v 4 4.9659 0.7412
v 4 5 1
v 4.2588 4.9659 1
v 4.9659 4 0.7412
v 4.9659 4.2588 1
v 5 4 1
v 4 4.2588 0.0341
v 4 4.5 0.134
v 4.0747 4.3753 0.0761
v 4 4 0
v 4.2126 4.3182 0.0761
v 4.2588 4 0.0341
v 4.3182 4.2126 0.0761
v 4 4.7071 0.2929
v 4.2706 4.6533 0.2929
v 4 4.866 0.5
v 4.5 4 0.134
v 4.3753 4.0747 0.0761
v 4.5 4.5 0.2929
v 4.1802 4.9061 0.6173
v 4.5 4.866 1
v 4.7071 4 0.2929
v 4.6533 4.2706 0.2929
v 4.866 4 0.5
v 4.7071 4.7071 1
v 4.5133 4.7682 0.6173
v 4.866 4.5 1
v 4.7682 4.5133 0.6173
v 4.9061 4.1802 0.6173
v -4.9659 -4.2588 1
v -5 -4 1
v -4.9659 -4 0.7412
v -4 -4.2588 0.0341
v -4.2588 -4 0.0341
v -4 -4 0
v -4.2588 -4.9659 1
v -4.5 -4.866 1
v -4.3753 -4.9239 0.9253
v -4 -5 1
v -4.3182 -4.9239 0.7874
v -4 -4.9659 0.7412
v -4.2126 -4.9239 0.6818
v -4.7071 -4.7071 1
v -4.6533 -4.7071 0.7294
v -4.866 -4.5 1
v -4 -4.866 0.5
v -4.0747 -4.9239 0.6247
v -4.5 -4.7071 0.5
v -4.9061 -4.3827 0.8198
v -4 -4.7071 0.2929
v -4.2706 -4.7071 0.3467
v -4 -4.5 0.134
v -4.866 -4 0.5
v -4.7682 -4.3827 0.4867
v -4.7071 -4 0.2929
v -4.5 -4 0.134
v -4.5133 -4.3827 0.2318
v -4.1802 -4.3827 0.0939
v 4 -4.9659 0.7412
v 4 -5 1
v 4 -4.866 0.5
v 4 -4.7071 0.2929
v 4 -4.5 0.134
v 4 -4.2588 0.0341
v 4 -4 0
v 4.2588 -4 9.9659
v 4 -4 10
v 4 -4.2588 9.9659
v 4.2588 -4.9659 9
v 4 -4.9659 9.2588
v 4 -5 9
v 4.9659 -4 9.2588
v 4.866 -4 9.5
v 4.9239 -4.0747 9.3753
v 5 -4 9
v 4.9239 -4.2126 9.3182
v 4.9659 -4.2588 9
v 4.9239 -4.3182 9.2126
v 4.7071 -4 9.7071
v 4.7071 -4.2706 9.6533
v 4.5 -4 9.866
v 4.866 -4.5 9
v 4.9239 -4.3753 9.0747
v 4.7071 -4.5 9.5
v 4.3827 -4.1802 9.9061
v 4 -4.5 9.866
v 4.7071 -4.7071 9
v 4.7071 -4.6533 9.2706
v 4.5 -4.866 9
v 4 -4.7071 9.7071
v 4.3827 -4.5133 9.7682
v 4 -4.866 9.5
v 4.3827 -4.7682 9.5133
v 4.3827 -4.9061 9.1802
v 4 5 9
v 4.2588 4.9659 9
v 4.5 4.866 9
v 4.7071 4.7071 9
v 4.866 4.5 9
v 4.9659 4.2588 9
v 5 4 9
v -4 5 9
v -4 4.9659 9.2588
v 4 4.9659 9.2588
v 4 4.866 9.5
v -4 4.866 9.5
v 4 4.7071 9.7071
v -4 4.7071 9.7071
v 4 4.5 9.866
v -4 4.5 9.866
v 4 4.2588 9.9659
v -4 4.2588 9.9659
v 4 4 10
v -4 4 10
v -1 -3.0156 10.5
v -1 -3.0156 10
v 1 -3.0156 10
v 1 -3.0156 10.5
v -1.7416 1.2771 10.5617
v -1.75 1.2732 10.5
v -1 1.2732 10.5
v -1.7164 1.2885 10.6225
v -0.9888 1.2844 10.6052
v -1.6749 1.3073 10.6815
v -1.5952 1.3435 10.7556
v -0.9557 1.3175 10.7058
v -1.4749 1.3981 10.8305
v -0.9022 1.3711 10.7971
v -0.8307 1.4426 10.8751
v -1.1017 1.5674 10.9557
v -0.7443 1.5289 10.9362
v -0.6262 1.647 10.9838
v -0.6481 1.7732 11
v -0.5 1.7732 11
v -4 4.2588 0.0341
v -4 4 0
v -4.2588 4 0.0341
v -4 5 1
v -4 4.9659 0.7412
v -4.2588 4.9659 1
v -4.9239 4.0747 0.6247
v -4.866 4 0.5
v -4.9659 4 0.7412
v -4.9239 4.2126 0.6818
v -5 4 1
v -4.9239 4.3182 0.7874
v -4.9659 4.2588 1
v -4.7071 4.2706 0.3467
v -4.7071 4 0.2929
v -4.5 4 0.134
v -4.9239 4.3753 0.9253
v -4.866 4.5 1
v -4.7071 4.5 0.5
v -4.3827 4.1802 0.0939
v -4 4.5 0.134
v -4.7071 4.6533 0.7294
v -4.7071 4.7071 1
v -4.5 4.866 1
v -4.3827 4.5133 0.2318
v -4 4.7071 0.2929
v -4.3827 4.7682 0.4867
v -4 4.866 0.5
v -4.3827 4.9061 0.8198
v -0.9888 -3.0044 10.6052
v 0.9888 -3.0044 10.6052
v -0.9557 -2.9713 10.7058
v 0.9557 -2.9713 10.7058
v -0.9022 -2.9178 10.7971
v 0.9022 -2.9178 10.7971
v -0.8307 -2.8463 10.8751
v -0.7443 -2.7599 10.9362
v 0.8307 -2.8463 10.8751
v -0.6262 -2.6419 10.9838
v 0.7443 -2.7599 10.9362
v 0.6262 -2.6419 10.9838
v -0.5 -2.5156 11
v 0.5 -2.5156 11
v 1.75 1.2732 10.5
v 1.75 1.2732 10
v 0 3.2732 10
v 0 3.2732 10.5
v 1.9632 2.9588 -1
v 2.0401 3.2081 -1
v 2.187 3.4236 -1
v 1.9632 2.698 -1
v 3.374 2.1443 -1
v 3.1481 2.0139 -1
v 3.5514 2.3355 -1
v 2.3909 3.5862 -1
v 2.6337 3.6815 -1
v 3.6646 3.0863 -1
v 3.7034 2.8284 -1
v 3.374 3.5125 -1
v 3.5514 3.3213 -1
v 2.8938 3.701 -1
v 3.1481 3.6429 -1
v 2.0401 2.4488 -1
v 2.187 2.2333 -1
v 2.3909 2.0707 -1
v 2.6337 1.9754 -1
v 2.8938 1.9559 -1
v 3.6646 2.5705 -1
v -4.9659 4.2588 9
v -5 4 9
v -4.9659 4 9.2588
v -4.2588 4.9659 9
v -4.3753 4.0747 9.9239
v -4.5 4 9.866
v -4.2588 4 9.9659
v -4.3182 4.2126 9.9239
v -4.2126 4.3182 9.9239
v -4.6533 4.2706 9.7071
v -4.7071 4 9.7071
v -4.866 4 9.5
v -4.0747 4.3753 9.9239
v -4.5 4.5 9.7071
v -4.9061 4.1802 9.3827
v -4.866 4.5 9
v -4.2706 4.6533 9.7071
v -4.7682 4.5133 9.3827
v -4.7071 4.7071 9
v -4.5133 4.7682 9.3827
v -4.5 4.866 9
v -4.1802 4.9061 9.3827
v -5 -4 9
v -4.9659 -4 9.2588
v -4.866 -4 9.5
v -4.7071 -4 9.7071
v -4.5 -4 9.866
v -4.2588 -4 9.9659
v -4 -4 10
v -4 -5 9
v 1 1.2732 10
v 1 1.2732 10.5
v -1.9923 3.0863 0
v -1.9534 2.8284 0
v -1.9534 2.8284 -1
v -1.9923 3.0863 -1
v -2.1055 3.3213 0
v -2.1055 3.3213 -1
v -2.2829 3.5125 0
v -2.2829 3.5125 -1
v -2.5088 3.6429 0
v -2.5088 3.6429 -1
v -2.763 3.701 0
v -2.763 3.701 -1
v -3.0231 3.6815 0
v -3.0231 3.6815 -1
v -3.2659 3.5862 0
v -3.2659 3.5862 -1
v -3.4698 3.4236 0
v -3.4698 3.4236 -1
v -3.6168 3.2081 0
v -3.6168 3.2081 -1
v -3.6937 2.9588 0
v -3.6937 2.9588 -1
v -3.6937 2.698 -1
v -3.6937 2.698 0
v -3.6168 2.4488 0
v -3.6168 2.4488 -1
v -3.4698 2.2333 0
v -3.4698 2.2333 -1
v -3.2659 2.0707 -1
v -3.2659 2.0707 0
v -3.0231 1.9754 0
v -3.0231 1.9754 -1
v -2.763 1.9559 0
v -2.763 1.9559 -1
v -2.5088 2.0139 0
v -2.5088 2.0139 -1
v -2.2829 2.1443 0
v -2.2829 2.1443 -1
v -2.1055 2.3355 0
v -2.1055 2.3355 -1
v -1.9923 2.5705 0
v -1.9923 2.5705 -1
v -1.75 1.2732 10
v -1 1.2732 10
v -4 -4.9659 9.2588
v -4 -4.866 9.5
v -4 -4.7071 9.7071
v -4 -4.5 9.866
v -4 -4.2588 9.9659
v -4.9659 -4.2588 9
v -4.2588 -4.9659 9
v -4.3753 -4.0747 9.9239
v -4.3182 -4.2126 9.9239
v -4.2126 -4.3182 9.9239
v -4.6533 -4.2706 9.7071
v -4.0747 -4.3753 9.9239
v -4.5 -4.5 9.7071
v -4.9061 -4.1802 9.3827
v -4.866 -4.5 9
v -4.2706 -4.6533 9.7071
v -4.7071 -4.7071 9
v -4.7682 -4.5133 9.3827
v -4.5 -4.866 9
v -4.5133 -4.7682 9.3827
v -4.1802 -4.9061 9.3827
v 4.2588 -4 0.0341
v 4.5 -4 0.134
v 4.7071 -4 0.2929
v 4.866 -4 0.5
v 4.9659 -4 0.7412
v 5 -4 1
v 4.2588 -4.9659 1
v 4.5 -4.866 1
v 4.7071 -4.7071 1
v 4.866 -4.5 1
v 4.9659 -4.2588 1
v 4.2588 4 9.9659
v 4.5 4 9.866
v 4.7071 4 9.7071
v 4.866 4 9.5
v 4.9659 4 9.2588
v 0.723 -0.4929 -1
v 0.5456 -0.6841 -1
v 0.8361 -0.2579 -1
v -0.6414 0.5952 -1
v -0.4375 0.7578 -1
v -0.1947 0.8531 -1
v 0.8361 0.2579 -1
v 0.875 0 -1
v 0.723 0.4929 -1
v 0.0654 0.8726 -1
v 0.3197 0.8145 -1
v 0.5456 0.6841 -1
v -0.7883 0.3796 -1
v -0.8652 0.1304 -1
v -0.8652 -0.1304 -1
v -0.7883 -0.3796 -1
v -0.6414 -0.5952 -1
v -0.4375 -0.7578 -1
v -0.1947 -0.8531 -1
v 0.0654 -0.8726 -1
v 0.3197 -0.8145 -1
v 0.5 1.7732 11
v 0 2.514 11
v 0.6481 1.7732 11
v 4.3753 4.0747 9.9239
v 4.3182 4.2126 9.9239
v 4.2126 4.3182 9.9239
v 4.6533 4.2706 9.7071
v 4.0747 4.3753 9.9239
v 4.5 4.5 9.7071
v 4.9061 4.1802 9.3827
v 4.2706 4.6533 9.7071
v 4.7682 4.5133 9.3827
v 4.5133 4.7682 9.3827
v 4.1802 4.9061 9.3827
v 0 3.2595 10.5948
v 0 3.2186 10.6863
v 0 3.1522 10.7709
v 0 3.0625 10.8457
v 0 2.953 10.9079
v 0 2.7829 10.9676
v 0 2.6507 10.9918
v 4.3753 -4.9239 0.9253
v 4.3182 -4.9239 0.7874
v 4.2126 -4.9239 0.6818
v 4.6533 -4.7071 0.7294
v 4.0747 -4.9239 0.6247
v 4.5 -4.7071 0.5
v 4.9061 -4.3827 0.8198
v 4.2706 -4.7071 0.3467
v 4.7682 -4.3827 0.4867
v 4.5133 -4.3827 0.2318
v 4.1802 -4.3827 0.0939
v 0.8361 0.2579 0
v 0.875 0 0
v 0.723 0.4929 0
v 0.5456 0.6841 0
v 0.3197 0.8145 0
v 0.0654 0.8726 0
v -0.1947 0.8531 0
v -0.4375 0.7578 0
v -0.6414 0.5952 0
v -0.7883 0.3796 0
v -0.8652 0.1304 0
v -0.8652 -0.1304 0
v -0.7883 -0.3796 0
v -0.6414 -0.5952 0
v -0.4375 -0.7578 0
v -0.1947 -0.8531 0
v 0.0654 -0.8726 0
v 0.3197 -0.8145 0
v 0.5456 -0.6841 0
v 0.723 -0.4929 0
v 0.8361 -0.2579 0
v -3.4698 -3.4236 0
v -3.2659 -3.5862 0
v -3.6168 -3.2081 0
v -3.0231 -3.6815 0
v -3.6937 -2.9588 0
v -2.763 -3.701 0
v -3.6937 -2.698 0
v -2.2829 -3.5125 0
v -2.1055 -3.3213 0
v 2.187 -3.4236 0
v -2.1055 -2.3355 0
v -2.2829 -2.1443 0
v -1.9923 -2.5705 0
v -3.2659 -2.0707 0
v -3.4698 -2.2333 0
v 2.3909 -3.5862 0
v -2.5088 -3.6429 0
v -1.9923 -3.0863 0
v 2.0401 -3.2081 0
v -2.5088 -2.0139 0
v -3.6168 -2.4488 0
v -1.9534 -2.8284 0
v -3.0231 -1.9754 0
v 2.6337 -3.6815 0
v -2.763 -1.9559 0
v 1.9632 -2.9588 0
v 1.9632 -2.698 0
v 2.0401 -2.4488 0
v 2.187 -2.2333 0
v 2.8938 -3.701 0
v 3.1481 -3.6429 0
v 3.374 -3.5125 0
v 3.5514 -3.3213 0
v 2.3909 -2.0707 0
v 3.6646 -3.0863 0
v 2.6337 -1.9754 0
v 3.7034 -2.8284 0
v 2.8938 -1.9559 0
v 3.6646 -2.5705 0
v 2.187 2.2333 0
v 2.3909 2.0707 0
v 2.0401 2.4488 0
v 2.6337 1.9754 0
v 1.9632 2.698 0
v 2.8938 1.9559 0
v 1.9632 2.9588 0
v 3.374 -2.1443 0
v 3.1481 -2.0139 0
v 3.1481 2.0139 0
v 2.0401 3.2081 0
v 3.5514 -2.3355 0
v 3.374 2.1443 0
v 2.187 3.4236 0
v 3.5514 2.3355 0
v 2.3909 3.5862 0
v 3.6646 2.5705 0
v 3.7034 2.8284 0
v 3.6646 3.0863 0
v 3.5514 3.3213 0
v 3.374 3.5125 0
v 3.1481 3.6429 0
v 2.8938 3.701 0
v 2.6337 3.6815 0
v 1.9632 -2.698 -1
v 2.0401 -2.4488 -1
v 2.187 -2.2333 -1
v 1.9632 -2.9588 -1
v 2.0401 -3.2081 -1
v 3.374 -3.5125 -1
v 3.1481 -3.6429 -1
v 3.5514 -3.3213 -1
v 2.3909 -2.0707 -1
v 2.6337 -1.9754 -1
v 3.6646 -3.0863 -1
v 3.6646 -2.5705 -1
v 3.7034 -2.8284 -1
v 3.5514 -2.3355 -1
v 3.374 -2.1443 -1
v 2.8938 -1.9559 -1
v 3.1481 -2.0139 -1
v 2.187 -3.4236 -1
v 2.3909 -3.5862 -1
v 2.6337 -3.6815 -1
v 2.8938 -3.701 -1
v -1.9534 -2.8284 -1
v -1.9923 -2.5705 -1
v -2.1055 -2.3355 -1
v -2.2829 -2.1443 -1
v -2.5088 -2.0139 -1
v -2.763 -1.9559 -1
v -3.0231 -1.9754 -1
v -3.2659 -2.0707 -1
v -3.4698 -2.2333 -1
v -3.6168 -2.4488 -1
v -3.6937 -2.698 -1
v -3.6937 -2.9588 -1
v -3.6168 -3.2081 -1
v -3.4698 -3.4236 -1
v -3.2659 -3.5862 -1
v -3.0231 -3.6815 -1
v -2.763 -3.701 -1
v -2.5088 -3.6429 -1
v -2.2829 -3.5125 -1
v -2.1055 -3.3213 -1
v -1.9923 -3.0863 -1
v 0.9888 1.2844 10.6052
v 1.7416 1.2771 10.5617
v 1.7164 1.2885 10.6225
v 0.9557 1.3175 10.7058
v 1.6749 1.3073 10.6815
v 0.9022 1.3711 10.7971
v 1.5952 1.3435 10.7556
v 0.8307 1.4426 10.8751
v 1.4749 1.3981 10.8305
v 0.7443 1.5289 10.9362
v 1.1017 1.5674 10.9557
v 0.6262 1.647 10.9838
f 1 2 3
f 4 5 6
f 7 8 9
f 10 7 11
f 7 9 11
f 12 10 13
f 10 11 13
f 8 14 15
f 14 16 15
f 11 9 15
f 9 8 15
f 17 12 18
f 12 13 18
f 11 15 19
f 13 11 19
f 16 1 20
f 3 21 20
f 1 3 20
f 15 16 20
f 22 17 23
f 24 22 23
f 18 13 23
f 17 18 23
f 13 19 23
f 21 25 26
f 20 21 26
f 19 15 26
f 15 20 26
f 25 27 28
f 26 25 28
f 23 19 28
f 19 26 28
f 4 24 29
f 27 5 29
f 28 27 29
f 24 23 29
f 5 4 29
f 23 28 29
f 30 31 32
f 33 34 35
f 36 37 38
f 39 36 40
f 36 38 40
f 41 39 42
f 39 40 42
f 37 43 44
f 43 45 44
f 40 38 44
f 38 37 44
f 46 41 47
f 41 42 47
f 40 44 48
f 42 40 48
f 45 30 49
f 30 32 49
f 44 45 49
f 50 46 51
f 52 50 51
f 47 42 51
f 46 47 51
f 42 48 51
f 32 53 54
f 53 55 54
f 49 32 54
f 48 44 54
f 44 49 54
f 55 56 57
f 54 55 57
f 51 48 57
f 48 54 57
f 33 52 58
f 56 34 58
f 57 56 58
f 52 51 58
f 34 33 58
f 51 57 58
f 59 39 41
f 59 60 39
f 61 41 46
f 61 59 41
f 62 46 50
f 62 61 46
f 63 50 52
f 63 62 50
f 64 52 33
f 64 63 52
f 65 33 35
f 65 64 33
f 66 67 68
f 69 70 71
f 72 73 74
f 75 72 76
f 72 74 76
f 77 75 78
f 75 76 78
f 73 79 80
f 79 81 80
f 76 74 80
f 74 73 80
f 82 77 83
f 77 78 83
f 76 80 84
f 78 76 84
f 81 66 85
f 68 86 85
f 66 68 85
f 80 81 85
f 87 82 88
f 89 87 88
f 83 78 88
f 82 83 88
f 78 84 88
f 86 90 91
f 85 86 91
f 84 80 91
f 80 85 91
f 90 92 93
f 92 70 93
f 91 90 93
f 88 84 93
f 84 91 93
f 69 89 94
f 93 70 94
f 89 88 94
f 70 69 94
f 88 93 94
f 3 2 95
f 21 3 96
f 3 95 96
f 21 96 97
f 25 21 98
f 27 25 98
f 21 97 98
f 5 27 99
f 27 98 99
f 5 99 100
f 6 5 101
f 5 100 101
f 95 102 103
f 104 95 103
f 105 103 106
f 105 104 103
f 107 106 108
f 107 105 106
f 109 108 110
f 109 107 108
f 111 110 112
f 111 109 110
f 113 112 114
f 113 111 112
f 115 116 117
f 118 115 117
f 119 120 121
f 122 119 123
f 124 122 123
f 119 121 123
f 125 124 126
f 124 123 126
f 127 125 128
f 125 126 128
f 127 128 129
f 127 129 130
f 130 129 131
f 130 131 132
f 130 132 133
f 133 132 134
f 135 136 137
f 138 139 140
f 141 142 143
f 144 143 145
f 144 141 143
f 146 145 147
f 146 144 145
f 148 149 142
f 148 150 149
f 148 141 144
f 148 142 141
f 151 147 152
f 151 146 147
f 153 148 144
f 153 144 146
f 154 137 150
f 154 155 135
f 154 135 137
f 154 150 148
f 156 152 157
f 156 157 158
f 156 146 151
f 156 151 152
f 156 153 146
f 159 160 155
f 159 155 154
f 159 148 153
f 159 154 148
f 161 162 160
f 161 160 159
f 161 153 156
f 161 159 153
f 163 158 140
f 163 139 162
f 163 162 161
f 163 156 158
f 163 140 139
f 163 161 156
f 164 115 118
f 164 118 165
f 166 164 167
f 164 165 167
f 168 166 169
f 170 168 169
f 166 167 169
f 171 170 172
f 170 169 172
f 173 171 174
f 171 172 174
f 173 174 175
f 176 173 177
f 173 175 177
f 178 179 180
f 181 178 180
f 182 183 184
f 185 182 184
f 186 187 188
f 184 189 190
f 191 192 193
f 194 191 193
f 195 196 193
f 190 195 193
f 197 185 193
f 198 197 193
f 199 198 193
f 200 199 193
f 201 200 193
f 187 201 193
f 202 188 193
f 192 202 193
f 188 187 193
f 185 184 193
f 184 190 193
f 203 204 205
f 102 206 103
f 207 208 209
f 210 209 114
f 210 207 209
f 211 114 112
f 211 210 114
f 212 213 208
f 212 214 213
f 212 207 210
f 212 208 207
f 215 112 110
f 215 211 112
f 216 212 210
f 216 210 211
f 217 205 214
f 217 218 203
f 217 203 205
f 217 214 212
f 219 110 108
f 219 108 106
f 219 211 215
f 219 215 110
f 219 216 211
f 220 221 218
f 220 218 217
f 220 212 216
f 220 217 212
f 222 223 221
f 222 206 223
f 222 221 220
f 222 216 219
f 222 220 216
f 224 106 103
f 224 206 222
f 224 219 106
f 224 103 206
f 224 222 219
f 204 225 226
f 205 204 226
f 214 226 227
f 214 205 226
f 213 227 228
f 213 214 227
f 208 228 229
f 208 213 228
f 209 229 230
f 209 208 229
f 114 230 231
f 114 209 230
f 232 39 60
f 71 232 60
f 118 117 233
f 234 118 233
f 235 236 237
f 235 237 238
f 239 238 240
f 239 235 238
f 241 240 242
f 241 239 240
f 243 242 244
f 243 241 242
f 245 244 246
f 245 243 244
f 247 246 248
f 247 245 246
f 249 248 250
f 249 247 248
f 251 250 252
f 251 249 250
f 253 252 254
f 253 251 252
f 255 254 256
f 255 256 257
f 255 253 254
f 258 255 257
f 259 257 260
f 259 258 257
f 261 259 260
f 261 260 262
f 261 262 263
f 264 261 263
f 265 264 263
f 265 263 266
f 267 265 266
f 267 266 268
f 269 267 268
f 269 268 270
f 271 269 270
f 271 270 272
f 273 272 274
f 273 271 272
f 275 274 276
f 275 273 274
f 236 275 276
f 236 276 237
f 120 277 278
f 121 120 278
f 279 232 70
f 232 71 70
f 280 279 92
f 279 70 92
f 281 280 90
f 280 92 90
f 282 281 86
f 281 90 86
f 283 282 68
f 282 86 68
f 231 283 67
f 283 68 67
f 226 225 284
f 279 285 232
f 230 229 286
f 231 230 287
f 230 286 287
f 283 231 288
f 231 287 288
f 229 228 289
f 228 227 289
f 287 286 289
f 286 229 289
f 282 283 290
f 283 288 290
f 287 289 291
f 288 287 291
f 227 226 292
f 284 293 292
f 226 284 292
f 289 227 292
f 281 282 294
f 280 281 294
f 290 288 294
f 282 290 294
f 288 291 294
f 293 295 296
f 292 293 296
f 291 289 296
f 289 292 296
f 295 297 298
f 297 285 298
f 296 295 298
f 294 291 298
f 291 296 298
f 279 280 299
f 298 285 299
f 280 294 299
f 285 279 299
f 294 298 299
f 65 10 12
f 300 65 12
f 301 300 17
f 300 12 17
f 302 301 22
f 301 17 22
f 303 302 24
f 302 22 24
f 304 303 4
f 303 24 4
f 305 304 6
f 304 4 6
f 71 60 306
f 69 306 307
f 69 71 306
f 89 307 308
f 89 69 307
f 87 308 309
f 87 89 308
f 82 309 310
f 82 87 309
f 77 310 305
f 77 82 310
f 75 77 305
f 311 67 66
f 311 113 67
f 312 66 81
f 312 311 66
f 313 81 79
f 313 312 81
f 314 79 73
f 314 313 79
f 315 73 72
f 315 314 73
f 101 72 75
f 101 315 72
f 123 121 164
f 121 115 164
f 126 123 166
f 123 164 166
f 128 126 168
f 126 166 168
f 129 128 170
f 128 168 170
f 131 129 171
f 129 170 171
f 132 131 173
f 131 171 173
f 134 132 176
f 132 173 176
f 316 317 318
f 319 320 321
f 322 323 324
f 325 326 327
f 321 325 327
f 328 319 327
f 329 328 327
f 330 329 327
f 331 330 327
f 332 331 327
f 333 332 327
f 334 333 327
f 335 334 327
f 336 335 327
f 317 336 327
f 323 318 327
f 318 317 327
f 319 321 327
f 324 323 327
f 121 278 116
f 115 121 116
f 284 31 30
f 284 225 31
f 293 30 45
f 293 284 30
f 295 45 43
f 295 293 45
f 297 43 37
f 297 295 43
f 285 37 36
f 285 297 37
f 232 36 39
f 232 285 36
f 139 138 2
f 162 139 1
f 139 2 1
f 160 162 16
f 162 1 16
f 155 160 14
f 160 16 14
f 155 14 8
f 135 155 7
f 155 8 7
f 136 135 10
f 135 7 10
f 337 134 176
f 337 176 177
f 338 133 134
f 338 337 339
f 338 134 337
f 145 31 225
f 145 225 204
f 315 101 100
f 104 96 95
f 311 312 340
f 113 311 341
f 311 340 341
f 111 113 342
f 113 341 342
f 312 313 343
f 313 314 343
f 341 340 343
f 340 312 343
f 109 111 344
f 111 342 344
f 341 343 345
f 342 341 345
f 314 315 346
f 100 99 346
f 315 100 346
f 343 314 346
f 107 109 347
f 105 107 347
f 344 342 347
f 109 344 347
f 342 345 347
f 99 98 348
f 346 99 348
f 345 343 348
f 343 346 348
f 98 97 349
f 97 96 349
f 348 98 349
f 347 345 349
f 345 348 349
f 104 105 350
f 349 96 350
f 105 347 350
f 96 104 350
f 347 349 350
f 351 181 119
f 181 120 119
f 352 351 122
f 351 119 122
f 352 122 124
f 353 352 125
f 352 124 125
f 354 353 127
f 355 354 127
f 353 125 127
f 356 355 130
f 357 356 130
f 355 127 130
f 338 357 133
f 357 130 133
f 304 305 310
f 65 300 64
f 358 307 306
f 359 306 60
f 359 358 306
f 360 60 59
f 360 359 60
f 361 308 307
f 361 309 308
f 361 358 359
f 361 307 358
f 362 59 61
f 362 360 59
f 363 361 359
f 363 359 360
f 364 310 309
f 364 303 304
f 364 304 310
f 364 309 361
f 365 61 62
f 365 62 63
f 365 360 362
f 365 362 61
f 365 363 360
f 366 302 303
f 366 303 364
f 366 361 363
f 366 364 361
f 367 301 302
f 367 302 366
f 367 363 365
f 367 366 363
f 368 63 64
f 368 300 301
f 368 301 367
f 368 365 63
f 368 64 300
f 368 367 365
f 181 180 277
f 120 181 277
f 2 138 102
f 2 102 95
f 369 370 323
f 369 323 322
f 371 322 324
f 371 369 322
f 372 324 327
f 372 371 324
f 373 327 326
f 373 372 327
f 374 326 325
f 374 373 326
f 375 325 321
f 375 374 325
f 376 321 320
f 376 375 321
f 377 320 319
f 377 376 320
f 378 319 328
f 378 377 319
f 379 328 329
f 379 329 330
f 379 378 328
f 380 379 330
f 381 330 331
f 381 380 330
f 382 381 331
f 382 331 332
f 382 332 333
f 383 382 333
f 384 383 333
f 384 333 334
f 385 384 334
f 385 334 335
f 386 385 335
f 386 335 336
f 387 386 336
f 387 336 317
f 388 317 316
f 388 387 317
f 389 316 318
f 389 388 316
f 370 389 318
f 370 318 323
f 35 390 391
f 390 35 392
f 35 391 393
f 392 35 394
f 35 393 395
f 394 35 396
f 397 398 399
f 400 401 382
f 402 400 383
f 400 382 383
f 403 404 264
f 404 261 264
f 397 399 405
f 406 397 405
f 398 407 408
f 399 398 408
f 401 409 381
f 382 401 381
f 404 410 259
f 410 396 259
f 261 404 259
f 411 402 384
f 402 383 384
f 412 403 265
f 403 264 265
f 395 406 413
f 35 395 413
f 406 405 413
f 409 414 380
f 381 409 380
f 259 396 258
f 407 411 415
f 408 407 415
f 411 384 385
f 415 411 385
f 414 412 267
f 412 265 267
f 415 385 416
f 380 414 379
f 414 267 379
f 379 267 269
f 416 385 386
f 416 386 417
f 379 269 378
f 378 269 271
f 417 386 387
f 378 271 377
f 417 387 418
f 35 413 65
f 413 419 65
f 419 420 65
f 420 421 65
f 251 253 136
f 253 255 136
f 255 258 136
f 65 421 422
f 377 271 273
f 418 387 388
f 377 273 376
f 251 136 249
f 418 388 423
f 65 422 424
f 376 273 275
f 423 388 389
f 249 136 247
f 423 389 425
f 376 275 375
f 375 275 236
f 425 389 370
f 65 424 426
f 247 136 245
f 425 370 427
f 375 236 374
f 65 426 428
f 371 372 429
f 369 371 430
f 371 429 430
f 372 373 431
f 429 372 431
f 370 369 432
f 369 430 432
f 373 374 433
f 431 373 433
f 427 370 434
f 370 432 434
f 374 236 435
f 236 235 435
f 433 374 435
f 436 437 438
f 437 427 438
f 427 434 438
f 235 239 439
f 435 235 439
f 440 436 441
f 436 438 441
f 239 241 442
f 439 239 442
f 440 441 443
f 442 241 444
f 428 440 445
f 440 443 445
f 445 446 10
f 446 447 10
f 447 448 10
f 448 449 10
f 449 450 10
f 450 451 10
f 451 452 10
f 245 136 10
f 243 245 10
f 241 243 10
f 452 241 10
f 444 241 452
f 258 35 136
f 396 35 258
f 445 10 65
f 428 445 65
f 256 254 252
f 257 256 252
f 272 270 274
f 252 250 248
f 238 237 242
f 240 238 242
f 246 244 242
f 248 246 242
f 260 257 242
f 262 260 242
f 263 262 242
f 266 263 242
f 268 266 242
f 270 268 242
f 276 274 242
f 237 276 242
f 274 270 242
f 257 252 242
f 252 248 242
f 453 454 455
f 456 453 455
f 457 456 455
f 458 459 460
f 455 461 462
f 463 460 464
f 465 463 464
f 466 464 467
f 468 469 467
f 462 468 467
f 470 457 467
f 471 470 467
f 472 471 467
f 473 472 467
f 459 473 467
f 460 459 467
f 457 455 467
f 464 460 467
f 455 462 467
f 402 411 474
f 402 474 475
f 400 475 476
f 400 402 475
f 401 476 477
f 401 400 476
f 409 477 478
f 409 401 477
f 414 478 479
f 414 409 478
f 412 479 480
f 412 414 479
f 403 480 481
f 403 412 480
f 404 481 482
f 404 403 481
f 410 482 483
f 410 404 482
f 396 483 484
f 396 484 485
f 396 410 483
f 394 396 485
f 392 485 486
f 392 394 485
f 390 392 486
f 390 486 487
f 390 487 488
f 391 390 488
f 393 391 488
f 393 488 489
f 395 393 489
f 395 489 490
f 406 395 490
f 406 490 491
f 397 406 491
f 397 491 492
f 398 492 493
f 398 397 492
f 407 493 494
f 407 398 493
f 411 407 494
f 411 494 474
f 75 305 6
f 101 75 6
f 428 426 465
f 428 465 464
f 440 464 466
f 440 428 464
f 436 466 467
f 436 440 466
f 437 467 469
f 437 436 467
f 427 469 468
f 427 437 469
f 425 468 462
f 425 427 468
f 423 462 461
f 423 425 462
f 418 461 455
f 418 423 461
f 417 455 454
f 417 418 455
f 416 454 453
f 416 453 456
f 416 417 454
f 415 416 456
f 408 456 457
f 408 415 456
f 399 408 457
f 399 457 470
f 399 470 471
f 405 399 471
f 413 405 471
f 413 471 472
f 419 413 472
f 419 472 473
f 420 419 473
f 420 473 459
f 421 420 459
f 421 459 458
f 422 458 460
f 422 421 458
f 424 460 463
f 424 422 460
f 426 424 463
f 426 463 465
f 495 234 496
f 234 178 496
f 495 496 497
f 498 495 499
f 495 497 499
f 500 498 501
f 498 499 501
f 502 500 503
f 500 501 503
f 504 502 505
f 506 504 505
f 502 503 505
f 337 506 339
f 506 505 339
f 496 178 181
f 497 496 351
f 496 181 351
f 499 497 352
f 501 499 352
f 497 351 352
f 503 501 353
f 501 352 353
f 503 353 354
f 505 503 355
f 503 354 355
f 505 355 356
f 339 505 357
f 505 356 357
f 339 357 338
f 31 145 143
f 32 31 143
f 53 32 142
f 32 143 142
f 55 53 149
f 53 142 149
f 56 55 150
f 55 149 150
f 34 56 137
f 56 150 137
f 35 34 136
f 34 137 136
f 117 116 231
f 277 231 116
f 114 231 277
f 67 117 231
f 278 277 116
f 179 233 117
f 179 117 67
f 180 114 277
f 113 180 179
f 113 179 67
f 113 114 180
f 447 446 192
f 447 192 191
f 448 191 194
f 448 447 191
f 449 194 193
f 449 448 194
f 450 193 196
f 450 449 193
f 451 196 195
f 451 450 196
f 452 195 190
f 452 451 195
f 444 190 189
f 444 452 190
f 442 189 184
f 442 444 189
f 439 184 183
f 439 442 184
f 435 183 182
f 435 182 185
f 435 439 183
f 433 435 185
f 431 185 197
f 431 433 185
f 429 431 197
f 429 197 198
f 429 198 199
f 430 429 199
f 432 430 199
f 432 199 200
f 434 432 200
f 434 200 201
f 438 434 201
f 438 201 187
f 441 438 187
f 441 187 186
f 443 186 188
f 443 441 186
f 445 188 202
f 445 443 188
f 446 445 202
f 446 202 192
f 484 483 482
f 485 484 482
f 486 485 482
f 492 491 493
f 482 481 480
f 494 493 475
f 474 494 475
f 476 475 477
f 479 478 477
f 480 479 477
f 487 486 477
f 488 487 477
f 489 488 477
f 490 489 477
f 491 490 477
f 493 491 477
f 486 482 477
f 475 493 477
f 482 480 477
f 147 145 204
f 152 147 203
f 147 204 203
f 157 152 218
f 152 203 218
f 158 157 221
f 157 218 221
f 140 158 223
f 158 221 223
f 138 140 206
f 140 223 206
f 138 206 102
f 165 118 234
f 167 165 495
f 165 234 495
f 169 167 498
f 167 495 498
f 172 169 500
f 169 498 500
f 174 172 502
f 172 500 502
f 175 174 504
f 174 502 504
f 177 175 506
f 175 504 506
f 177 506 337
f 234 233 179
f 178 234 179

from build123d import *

# Parameters (mm, degrees)
F0_W     = 10
F0_H     = 10
F0_R     = 0.875
F1_DEPTH = 10
F2_DEPTH = 1
F3_R     = 1
F5_DEPTH = 1
F6_R     = 0.5


with BuildPart() as f1:
    # F0 (on Top) → F1 (new body)
    with BuildSketch(Plane.XY):
        Rectangle(F0_W, F0_H)
        with Locations((-2.828427, -2.828427)):
            Circle(F0_R, mode=Mode.SUBTRACT)
        with Locations((2.828427, -2.828427)):
            Circle(F0_R, mode=Mode.SUBTRACT)
        with Locations((-2.828427, 2.828427)):
            Circle(F0_R, mode=Mode.SUBTRACT)
        Circle(F0_R, mode=Mode.SUBTRACT)
        with Locations((2.828427, 2.828427)):
            Circle(F0_R, mode=Mode.SUBTRACT)
        with Locations((-2.828427, -2.828427)):
            Circle(F0_R)
        with Locations((-2.828427, 2.828427)):
            Circle(F0_R)
        with Locations((2.828427, 2.828427)):
            Circle(F0_R)
        with Locations((2.828427, -2.828427)):
            Circle(F0_R)
        Circle(F0_R)
    extrude(amount=F1_DEPTH)

    # F0 (on Top) → F2 (join)
    with BuildSketch(Plane.XY):
        with Locations((2.828427, 2.828427)):
            Circle(F0_R)
        with Locations((-2.828427, 2.828427)):
            Circle(F0_R)
        with Locations((-2.828427, -2.828427)):
            Circle(F0_R)
        with Locations((2.828427, -2.828427)):
            Circle(F0_R)
        Circle(F0_R)
    extrude(amount=-F2_DEPTH)

    # F3
    f3_edges = [f1.edges().sort_by_distance(p)[0] for p in [
        (5, 5, 5),
        (0, 5, 0),
        (5, 0, 0),
        (-5, 0, 0),
        (-5, 5, 5),
        (-5, -5, 5),
        (-5, 0, 10),
        (0, -5, 10),
        (5, 0, 10),
        (0, 5, 10),
        (5, -5, 5),
        (0, -5, 0),
    ]]
    fillet(f3_edges, radius=F3_R)

    # F4 (on face) → F5 (join)
    with BuildSketch(Plane.XY.offset(10)):
        Polygon((-1, 1.273247), (-1, 0), (-1, -3.015627), (1, -3.015627), (1, 1.273247), (1.75, 1.273247), (0, 3.273247), (-1.75, 1.273247), align=None)
    extrude(amount=F5_DEPTH)

    # F6
    f6_edges = [f1.edges().sort_by_distance(p)[0] for p in [
        (-0.875, 2.273247, 11),
        (-1.375, 1.273247, 11),
        (-1, -0.87119, 11),
        (0, -3.015627, 11),
        (1, -0.87119, 11),
        (1.375, 1.273247, 11),
        (0.875, 2.273247, 11),
    ]]
    fillet(f6_edges, radius=F6_R)


solid = f1.part
